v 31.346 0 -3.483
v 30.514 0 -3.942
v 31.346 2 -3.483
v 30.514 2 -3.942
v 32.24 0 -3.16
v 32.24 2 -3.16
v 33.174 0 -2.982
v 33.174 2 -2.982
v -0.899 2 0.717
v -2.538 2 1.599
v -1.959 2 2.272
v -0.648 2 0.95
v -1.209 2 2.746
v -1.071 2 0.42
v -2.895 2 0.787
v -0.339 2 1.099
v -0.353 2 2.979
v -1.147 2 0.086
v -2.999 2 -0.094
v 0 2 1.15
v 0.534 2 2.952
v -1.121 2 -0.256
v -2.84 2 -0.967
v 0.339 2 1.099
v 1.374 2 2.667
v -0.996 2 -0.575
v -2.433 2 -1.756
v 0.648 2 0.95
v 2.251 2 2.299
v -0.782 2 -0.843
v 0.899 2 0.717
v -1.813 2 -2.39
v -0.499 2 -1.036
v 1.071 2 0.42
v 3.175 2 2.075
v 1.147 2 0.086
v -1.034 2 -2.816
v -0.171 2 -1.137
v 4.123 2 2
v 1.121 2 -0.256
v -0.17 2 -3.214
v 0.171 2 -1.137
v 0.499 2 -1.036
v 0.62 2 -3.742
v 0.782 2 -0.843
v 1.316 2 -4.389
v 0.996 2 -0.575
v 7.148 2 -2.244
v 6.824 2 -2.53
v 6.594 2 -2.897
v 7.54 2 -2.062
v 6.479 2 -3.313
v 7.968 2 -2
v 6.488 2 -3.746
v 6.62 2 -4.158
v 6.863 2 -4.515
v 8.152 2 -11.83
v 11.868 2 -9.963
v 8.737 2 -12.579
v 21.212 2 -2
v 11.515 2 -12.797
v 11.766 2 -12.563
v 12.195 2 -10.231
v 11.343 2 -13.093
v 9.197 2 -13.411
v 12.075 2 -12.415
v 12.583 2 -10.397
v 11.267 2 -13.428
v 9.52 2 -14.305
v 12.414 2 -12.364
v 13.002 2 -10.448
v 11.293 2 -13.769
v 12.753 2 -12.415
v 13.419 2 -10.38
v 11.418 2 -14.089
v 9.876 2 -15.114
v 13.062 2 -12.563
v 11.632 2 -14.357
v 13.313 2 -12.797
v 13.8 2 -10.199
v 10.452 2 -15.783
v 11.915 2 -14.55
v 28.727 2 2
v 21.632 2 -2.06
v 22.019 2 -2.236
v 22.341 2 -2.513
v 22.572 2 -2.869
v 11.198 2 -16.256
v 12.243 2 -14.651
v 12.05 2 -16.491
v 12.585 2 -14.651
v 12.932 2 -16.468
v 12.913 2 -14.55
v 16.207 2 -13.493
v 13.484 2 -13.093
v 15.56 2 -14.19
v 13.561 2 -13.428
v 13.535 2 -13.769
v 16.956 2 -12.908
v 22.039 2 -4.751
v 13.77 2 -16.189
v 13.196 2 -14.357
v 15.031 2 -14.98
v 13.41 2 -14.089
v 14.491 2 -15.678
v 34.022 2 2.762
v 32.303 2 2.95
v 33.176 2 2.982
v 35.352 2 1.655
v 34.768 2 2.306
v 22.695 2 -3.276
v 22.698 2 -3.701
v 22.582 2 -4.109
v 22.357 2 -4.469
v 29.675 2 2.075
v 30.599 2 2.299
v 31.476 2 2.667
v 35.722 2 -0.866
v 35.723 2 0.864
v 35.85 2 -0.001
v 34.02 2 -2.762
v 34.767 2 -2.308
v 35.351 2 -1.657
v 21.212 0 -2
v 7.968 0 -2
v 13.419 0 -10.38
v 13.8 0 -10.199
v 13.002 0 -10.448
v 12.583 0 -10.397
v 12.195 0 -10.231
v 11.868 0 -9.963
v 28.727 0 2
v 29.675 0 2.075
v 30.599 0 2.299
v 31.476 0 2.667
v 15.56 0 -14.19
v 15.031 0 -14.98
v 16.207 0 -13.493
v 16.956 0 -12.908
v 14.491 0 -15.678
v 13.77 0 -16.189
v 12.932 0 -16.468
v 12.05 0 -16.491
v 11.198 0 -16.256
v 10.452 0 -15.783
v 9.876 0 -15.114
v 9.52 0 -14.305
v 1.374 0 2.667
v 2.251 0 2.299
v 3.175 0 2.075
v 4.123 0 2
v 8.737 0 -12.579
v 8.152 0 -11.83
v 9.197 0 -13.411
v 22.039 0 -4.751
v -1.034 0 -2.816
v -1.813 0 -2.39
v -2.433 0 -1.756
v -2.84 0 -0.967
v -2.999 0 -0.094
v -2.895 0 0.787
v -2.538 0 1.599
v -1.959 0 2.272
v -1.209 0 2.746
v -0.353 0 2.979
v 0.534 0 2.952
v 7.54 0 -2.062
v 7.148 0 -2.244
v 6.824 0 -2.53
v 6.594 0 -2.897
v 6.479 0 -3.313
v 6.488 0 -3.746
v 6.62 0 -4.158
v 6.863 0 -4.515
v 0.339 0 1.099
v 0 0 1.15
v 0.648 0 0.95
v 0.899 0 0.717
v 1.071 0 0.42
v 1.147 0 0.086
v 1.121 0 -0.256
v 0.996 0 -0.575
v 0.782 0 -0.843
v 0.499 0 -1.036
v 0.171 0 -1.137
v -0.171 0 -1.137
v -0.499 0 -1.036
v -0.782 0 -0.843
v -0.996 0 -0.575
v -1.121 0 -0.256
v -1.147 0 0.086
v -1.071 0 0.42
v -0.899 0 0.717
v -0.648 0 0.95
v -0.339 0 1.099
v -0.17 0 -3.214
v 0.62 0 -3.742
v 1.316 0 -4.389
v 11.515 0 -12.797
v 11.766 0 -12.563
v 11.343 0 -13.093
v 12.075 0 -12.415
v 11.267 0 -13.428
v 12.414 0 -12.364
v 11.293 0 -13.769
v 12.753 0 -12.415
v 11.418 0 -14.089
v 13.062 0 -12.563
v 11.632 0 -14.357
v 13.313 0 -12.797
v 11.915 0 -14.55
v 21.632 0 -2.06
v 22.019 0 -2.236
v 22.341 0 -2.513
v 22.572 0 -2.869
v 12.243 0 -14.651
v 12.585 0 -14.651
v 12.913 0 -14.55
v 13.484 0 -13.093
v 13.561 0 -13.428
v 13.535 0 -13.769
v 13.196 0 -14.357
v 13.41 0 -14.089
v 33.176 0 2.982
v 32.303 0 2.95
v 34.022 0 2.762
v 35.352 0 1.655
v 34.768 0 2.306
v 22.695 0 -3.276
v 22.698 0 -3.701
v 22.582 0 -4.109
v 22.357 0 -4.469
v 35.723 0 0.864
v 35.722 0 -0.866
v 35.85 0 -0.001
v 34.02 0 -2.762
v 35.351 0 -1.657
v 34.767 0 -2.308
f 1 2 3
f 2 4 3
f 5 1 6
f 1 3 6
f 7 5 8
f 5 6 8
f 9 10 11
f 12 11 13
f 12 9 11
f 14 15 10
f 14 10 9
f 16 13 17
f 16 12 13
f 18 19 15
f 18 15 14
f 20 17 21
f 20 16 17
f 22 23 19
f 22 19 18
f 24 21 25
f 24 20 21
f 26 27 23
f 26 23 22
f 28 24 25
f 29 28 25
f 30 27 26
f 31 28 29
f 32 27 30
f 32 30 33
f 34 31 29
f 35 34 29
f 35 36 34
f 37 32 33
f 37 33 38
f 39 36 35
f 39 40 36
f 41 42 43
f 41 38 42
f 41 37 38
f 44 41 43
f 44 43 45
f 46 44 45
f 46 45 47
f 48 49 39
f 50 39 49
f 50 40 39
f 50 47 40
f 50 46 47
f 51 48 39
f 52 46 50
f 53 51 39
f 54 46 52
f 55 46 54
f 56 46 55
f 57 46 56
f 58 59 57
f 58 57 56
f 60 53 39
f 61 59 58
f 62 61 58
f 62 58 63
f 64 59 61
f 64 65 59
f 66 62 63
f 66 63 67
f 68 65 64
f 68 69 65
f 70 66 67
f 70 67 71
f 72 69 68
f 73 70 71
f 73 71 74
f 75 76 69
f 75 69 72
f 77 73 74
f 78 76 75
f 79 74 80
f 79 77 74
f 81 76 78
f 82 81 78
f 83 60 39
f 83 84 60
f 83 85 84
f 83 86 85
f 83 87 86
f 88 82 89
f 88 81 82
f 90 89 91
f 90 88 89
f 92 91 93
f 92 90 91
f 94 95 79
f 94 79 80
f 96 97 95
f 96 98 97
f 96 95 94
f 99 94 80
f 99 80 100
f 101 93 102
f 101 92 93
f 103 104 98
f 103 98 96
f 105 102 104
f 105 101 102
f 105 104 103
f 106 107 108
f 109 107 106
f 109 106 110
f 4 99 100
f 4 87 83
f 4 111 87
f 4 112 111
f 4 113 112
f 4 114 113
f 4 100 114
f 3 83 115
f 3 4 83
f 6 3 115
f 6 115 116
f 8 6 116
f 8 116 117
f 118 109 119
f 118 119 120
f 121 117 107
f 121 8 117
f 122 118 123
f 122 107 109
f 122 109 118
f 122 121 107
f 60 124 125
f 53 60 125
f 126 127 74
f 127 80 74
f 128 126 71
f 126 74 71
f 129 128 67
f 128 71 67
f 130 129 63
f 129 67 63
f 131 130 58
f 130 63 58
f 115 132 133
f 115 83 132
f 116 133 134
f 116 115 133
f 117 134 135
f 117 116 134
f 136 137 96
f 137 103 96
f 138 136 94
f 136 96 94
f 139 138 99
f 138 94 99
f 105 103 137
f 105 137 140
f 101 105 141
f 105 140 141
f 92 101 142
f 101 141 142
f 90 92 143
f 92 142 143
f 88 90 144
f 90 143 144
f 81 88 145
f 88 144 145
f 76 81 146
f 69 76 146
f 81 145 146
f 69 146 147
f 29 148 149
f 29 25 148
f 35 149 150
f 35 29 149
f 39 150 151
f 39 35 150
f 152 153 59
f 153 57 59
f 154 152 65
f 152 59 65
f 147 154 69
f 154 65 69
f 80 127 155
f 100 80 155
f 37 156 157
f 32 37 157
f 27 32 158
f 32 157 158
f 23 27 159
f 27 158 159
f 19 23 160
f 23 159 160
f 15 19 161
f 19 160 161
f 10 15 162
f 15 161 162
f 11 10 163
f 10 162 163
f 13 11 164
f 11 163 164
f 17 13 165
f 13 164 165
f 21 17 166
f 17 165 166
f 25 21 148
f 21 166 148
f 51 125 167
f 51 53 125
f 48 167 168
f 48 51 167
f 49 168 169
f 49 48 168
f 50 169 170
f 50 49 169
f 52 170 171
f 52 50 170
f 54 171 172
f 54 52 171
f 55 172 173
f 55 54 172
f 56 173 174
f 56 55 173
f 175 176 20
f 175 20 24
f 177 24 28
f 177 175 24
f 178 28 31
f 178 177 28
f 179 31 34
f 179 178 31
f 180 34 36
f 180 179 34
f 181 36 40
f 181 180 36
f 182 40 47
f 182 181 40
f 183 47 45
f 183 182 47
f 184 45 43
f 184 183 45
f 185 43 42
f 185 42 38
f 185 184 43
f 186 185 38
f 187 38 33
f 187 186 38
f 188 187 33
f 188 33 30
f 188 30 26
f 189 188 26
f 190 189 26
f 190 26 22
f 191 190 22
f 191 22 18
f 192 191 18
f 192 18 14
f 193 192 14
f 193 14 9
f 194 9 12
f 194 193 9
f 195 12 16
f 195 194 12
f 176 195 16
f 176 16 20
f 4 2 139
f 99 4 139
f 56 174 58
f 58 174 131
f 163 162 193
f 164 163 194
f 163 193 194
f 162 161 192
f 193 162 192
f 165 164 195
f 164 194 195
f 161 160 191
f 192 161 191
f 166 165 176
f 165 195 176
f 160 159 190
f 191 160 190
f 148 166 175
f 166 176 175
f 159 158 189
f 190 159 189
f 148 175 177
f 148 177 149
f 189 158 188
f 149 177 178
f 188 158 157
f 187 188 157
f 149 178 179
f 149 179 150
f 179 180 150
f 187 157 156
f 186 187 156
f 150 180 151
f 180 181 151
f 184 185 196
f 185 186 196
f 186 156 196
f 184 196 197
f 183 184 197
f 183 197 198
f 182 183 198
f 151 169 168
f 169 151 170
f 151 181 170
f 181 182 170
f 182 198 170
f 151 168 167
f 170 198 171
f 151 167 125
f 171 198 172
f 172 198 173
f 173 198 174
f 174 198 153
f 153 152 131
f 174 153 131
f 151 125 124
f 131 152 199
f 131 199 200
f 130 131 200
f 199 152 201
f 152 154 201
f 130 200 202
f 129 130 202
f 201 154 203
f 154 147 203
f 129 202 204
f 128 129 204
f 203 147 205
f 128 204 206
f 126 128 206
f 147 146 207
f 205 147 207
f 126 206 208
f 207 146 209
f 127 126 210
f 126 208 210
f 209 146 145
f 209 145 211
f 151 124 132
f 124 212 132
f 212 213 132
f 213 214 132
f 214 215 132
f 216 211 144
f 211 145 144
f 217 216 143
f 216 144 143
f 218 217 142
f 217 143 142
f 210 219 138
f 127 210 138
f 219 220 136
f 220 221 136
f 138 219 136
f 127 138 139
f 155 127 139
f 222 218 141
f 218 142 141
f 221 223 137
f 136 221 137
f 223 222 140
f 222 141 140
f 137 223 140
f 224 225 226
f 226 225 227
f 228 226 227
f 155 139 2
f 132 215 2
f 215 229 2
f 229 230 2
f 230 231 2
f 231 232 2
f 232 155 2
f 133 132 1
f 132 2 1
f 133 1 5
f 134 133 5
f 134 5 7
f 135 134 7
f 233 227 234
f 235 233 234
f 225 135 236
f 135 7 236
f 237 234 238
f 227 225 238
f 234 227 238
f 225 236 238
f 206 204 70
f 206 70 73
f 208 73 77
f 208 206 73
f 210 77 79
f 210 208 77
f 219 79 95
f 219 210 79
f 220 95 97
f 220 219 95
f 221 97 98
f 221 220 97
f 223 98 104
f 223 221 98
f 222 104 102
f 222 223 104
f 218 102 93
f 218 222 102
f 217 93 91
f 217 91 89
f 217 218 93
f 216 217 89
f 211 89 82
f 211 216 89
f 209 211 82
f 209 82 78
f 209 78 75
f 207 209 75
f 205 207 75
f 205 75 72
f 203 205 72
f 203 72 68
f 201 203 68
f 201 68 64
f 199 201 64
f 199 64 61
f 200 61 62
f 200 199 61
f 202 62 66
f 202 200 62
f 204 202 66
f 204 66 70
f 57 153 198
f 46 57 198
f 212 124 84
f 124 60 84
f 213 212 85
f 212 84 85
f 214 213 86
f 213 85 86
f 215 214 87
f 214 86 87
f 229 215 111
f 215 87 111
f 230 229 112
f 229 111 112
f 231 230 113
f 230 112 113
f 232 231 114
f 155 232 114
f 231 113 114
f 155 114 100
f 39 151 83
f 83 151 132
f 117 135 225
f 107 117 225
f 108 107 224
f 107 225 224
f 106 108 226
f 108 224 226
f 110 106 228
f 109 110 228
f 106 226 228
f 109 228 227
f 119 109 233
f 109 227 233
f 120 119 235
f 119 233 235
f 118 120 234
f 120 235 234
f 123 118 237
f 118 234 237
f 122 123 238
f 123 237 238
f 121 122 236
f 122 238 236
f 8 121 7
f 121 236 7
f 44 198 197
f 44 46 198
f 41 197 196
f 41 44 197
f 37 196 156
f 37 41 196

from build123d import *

# Parameters (mm, degrees)
SKETCH_1_R      = 1.15
EXTRUDE_1_DEPTH = 2
FILLET_1_R      = 6
FILLET_2_R      = 1.5


with BuildPart() as part:
    # Эскиз1 → Бобышка-Вытянуть1 (new body)
    with BuildSketch(Plane(origin=(0, 0, 0), x_dir=(1, 0, 0), z_dir=(0, 1, 0))):
        with BuildLine():
            Line((9.428338388, 13.219880501), (0.039848451, 2.999735338))
            ThreePointArc((0.039848451, 2.999735338), (-2.746686597, -1.206529212), (2.236067977, -2))
            Line((2.236067977, -2), (30.613932023, -2))
            ThreePointArc((30.613932023, -2), (35.722901746, -0.863965023), (32.087988444, 2.90160962))
            Line((32.087988444, 2.90160962), (15.382237716, 13.948474823))
            ThreePointArc((15.382237716, 13.948474823), (12.049527364, 16.491369305), (9.428338388, 13.219880501))
        make_face()
        with Locations(Location((0, 0, 0), (0, 0, 270))):
            Circle(SKETCH_1_R, mode=Mode.SUBTRACT)
        with Locations(Location((12.413926941, 13.513582719, 0), (0, 0, 270))):
            Circle(SKETCH_1_R, mode=Mode.SUBTRACT)
        Polygon((4.55303787, 2), (12.733176086, 10.904754713), (26.199495246, 2), align=None, mode=Mode.SUBTRACT)
    extrude(amount=EXTRUDE_1_DEPTH)

    # Скругление1
    fillet_1_edges = [part.edges().sort_by_distance(p)[0] for p in [
        (2.236067977, 1, 2),
        (0.039848451, 1, -2.999735338),
        (9.428338388, 1, -13.219880501),
        (15.382237716, 1, -13.948474823),
        (32.087988444, 1, -2.90160962),
        (30.613932023, 1, 2),
    ]]
    fillet(fillet_1_edges, radius=FILLET_1_R)

    # Скругление2
    fillet_2_edges = [part.edges().sort_by_distance(p)[0] for p in [
        (26.199495246, 1, -2),
        (12.733176086, 1, -10.904754713),
        (4.55303787, 1, -2),
    ]]
    fillet(fillet_2_edges, radius=FILLET_2_R)


solid = part.part
